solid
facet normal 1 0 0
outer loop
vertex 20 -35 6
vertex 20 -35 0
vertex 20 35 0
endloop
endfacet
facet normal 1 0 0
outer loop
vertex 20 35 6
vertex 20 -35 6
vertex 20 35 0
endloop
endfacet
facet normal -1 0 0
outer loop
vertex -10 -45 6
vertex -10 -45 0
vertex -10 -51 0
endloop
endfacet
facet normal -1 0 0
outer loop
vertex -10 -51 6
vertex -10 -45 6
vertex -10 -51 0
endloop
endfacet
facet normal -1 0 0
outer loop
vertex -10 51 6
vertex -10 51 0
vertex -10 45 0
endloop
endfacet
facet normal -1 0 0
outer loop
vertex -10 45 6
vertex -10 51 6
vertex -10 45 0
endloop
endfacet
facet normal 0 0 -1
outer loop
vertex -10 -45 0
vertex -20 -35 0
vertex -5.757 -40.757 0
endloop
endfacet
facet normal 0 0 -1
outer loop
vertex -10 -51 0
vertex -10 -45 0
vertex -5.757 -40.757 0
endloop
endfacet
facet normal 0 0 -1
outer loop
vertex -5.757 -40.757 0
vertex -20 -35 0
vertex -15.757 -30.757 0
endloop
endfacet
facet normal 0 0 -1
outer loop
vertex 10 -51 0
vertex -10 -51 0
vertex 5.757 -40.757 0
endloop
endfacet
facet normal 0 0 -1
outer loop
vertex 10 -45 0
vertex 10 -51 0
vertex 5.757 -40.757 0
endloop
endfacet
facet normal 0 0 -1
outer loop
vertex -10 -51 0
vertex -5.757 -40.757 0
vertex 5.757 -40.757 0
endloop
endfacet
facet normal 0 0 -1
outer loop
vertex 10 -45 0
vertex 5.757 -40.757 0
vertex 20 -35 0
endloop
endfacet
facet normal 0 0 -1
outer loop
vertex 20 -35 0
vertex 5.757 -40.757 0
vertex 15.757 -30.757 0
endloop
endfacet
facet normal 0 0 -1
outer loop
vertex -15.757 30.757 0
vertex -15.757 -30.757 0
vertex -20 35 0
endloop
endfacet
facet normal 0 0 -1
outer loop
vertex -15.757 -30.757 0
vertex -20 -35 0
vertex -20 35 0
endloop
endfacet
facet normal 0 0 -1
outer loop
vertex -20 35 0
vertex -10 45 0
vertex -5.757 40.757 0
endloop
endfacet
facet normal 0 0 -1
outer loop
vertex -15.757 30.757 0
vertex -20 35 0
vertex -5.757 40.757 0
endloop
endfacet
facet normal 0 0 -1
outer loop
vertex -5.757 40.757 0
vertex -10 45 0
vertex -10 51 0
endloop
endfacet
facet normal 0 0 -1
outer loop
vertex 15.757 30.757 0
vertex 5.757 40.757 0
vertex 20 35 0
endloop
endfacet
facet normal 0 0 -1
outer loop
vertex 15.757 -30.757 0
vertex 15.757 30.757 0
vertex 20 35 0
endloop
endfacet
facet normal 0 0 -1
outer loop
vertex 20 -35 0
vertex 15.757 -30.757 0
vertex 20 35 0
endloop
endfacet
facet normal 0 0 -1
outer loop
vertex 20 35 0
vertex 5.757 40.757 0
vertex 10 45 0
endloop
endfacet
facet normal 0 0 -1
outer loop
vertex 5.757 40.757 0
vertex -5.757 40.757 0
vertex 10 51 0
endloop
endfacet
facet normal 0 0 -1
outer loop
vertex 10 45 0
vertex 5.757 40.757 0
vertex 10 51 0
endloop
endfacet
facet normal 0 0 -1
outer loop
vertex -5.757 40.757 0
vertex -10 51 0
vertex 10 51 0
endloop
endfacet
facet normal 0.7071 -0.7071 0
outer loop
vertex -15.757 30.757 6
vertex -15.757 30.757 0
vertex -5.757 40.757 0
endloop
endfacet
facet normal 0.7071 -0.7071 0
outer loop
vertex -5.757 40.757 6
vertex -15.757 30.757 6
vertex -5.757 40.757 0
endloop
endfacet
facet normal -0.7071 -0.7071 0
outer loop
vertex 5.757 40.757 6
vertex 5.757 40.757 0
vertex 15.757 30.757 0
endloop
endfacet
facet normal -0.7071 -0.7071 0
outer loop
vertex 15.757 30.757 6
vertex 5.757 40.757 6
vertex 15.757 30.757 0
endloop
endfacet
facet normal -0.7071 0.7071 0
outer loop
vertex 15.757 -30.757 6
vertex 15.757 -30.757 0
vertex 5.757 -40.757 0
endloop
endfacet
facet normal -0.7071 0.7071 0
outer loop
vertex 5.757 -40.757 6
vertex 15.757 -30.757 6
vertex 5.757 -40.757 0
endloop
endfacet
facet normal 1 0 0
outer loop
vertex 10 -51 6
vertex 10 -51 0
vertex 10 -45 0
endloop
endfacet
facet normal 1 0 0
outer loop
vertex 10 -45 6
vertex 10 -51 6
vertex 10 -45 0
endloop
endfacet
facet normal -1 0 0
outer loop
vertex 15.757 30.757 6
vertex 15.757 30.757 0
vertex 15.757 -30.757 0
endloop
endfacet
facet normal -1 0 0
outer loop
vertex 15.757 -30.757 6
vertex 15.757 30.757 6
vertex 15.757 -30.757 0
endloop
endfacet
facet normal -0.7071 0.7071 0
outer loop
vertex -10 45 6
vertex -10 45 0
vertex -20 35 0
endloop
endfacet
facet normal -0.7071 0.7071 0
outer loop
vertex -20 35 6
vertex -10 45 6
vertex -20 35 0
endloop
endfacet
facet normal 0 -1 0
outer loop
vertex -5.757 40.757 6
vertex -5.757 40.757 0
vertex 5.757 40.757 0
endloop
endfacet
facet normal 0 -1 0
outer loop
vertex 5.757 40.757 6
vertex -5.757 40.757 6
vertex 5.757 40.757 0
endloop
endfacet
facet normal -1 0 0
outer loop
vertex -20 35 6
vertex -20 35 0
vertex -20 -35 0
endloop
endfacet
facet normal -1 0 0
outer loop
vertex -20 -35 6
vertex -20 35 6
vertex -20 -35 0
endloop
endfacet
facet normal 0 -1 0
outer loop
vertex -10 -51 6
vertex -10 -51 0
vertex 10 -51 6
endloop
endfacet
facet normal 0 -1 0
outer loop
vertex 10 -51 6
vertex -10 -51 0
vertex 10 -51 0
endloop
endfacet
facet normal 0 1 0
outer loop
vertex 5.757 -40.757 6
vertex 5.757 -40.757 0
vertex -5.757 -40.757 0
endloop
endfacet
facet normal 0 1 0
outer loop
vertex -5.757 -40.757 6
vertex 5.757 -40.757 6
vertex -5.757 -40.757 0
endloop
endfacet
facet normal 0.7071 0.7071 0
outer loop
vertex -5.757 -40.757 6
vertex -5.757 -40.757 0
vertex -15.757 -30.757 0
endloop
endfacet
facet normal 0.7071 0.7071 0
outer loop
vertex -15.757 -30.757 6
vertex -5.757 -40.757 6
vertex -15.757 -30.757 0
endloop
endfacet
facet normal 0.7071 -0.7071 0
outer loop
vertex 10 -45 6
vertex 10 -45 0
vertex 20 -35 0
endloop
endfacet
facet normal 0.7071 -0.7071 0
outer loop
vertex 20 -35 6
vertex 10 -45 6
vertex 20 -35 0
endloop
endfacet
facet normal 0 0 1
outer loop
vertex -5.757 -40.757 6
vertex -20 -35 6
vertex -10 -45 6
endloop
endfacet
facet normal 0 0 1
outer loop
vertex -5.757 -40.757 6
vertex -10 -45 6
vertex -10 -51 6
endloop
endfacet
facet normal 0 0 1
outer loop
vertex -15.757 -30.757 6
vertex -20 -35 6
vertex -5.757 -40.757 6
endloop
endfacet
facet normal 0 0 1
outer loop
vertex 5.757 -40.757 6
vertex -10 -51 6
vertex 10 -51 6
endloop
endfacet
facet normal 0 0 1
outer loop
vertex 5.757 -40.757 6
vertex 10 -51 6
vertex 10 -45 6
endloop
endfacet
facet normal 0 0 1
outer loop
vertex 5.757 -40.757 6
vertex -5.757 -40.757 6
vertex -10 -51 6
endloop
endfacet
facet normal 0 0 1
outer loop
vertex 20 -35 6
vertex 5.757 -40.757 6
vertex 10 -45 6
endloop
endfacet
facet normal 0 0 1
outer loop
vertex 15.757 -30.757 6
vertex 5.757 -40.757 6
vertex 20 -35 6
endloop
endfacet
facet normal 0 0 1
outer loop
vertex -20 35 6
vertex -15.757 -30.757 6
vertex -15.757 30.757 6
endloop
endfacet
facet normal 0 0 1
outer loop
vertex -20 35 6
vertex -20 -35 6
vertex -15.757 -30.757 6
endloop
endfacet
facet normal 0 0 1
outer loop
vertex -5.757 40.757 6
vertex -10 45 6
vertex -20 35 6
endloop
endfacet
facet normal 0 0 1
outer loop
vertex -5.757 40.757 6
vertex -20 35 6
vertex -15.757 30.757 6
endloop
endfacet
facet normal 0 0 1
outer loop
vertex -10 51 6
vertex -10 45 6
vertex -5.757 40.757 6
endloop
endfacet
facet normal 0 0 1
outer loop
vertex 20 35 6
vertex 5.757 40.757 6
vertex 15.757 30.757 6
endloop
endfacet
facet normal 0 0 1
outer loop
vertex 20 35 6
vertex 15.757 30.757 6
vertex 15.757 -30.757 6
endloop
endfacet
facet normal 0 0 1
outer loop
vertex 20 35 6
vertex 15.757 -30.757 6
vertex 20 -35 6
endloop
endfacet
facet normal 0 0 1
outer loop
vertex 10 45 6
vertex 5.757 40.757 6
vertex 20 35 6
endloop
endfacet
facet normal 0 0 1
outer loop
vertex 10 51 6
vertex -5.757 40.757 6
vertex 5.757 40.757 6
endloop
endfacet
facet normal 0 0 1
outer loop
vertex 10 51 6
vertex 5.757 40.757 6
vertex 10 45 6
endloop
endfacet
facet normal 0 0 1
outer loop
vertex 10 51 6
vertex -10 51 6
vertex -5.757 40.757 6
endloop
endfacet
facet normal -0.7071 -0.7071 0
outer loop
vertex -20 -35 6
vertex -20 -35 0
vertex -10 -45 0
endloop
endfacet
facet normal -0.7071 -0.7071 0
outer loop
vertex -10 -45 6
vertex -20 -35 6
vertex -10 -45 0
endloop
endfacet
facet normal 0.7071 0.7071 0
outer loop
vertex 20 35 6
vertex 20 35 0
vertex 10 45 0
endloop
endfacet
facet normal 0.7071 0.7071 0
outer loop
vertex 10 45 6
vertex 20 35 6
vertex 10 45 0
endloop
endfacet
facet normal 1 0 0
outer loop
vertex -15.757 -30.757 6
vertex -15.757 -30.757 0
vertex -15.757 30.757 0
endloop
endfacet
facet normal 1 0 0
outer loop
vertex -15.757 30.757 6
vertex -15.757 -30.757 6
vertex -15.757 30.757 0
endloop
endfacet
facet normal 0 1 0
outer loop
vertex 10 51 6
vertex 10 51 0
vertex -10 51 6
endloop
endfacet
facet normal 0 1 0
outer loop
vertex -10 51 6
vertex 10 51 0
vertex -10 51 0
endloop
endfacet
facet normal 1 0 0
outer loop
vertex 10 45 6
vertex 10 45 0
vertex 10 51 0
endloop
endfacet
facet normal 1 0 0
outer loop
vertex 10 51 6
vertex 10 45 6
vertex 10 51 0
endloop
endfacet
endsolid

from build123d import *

# Parameters (mm, degrees)
BOSS_EXTRUDE1_DEPTH = 6


with BuildPart() as part:
    # Sketch1 → Boss-Extrude1 (new body)
    with BuildSketch(Plane.XY):
        Polygon((20, -35), (20, 35), (10, 45), (10, 51), (-10, 51), (-10, 45), (-20, 35), (-20, -35), (-10, -45), (-10, -51), (10, -51), (10, -45), align=None)
        Polygon((5.757359313, 40.757359313), (15.757359313, 30.757359313), (15.757359313, -30.757359313), (5.757359313, -40.757359313), (-5.757359313, -40.757359313), (-15.757359313, -30.757359313), (-15.757359313, 30.757359313), (-5.757359313, 40.757359313), align=None, mode=Mode.SUBTRACT)
    extrude(amount=BOSS_EXTRUDE1_DEPTH)


solid = part.part
